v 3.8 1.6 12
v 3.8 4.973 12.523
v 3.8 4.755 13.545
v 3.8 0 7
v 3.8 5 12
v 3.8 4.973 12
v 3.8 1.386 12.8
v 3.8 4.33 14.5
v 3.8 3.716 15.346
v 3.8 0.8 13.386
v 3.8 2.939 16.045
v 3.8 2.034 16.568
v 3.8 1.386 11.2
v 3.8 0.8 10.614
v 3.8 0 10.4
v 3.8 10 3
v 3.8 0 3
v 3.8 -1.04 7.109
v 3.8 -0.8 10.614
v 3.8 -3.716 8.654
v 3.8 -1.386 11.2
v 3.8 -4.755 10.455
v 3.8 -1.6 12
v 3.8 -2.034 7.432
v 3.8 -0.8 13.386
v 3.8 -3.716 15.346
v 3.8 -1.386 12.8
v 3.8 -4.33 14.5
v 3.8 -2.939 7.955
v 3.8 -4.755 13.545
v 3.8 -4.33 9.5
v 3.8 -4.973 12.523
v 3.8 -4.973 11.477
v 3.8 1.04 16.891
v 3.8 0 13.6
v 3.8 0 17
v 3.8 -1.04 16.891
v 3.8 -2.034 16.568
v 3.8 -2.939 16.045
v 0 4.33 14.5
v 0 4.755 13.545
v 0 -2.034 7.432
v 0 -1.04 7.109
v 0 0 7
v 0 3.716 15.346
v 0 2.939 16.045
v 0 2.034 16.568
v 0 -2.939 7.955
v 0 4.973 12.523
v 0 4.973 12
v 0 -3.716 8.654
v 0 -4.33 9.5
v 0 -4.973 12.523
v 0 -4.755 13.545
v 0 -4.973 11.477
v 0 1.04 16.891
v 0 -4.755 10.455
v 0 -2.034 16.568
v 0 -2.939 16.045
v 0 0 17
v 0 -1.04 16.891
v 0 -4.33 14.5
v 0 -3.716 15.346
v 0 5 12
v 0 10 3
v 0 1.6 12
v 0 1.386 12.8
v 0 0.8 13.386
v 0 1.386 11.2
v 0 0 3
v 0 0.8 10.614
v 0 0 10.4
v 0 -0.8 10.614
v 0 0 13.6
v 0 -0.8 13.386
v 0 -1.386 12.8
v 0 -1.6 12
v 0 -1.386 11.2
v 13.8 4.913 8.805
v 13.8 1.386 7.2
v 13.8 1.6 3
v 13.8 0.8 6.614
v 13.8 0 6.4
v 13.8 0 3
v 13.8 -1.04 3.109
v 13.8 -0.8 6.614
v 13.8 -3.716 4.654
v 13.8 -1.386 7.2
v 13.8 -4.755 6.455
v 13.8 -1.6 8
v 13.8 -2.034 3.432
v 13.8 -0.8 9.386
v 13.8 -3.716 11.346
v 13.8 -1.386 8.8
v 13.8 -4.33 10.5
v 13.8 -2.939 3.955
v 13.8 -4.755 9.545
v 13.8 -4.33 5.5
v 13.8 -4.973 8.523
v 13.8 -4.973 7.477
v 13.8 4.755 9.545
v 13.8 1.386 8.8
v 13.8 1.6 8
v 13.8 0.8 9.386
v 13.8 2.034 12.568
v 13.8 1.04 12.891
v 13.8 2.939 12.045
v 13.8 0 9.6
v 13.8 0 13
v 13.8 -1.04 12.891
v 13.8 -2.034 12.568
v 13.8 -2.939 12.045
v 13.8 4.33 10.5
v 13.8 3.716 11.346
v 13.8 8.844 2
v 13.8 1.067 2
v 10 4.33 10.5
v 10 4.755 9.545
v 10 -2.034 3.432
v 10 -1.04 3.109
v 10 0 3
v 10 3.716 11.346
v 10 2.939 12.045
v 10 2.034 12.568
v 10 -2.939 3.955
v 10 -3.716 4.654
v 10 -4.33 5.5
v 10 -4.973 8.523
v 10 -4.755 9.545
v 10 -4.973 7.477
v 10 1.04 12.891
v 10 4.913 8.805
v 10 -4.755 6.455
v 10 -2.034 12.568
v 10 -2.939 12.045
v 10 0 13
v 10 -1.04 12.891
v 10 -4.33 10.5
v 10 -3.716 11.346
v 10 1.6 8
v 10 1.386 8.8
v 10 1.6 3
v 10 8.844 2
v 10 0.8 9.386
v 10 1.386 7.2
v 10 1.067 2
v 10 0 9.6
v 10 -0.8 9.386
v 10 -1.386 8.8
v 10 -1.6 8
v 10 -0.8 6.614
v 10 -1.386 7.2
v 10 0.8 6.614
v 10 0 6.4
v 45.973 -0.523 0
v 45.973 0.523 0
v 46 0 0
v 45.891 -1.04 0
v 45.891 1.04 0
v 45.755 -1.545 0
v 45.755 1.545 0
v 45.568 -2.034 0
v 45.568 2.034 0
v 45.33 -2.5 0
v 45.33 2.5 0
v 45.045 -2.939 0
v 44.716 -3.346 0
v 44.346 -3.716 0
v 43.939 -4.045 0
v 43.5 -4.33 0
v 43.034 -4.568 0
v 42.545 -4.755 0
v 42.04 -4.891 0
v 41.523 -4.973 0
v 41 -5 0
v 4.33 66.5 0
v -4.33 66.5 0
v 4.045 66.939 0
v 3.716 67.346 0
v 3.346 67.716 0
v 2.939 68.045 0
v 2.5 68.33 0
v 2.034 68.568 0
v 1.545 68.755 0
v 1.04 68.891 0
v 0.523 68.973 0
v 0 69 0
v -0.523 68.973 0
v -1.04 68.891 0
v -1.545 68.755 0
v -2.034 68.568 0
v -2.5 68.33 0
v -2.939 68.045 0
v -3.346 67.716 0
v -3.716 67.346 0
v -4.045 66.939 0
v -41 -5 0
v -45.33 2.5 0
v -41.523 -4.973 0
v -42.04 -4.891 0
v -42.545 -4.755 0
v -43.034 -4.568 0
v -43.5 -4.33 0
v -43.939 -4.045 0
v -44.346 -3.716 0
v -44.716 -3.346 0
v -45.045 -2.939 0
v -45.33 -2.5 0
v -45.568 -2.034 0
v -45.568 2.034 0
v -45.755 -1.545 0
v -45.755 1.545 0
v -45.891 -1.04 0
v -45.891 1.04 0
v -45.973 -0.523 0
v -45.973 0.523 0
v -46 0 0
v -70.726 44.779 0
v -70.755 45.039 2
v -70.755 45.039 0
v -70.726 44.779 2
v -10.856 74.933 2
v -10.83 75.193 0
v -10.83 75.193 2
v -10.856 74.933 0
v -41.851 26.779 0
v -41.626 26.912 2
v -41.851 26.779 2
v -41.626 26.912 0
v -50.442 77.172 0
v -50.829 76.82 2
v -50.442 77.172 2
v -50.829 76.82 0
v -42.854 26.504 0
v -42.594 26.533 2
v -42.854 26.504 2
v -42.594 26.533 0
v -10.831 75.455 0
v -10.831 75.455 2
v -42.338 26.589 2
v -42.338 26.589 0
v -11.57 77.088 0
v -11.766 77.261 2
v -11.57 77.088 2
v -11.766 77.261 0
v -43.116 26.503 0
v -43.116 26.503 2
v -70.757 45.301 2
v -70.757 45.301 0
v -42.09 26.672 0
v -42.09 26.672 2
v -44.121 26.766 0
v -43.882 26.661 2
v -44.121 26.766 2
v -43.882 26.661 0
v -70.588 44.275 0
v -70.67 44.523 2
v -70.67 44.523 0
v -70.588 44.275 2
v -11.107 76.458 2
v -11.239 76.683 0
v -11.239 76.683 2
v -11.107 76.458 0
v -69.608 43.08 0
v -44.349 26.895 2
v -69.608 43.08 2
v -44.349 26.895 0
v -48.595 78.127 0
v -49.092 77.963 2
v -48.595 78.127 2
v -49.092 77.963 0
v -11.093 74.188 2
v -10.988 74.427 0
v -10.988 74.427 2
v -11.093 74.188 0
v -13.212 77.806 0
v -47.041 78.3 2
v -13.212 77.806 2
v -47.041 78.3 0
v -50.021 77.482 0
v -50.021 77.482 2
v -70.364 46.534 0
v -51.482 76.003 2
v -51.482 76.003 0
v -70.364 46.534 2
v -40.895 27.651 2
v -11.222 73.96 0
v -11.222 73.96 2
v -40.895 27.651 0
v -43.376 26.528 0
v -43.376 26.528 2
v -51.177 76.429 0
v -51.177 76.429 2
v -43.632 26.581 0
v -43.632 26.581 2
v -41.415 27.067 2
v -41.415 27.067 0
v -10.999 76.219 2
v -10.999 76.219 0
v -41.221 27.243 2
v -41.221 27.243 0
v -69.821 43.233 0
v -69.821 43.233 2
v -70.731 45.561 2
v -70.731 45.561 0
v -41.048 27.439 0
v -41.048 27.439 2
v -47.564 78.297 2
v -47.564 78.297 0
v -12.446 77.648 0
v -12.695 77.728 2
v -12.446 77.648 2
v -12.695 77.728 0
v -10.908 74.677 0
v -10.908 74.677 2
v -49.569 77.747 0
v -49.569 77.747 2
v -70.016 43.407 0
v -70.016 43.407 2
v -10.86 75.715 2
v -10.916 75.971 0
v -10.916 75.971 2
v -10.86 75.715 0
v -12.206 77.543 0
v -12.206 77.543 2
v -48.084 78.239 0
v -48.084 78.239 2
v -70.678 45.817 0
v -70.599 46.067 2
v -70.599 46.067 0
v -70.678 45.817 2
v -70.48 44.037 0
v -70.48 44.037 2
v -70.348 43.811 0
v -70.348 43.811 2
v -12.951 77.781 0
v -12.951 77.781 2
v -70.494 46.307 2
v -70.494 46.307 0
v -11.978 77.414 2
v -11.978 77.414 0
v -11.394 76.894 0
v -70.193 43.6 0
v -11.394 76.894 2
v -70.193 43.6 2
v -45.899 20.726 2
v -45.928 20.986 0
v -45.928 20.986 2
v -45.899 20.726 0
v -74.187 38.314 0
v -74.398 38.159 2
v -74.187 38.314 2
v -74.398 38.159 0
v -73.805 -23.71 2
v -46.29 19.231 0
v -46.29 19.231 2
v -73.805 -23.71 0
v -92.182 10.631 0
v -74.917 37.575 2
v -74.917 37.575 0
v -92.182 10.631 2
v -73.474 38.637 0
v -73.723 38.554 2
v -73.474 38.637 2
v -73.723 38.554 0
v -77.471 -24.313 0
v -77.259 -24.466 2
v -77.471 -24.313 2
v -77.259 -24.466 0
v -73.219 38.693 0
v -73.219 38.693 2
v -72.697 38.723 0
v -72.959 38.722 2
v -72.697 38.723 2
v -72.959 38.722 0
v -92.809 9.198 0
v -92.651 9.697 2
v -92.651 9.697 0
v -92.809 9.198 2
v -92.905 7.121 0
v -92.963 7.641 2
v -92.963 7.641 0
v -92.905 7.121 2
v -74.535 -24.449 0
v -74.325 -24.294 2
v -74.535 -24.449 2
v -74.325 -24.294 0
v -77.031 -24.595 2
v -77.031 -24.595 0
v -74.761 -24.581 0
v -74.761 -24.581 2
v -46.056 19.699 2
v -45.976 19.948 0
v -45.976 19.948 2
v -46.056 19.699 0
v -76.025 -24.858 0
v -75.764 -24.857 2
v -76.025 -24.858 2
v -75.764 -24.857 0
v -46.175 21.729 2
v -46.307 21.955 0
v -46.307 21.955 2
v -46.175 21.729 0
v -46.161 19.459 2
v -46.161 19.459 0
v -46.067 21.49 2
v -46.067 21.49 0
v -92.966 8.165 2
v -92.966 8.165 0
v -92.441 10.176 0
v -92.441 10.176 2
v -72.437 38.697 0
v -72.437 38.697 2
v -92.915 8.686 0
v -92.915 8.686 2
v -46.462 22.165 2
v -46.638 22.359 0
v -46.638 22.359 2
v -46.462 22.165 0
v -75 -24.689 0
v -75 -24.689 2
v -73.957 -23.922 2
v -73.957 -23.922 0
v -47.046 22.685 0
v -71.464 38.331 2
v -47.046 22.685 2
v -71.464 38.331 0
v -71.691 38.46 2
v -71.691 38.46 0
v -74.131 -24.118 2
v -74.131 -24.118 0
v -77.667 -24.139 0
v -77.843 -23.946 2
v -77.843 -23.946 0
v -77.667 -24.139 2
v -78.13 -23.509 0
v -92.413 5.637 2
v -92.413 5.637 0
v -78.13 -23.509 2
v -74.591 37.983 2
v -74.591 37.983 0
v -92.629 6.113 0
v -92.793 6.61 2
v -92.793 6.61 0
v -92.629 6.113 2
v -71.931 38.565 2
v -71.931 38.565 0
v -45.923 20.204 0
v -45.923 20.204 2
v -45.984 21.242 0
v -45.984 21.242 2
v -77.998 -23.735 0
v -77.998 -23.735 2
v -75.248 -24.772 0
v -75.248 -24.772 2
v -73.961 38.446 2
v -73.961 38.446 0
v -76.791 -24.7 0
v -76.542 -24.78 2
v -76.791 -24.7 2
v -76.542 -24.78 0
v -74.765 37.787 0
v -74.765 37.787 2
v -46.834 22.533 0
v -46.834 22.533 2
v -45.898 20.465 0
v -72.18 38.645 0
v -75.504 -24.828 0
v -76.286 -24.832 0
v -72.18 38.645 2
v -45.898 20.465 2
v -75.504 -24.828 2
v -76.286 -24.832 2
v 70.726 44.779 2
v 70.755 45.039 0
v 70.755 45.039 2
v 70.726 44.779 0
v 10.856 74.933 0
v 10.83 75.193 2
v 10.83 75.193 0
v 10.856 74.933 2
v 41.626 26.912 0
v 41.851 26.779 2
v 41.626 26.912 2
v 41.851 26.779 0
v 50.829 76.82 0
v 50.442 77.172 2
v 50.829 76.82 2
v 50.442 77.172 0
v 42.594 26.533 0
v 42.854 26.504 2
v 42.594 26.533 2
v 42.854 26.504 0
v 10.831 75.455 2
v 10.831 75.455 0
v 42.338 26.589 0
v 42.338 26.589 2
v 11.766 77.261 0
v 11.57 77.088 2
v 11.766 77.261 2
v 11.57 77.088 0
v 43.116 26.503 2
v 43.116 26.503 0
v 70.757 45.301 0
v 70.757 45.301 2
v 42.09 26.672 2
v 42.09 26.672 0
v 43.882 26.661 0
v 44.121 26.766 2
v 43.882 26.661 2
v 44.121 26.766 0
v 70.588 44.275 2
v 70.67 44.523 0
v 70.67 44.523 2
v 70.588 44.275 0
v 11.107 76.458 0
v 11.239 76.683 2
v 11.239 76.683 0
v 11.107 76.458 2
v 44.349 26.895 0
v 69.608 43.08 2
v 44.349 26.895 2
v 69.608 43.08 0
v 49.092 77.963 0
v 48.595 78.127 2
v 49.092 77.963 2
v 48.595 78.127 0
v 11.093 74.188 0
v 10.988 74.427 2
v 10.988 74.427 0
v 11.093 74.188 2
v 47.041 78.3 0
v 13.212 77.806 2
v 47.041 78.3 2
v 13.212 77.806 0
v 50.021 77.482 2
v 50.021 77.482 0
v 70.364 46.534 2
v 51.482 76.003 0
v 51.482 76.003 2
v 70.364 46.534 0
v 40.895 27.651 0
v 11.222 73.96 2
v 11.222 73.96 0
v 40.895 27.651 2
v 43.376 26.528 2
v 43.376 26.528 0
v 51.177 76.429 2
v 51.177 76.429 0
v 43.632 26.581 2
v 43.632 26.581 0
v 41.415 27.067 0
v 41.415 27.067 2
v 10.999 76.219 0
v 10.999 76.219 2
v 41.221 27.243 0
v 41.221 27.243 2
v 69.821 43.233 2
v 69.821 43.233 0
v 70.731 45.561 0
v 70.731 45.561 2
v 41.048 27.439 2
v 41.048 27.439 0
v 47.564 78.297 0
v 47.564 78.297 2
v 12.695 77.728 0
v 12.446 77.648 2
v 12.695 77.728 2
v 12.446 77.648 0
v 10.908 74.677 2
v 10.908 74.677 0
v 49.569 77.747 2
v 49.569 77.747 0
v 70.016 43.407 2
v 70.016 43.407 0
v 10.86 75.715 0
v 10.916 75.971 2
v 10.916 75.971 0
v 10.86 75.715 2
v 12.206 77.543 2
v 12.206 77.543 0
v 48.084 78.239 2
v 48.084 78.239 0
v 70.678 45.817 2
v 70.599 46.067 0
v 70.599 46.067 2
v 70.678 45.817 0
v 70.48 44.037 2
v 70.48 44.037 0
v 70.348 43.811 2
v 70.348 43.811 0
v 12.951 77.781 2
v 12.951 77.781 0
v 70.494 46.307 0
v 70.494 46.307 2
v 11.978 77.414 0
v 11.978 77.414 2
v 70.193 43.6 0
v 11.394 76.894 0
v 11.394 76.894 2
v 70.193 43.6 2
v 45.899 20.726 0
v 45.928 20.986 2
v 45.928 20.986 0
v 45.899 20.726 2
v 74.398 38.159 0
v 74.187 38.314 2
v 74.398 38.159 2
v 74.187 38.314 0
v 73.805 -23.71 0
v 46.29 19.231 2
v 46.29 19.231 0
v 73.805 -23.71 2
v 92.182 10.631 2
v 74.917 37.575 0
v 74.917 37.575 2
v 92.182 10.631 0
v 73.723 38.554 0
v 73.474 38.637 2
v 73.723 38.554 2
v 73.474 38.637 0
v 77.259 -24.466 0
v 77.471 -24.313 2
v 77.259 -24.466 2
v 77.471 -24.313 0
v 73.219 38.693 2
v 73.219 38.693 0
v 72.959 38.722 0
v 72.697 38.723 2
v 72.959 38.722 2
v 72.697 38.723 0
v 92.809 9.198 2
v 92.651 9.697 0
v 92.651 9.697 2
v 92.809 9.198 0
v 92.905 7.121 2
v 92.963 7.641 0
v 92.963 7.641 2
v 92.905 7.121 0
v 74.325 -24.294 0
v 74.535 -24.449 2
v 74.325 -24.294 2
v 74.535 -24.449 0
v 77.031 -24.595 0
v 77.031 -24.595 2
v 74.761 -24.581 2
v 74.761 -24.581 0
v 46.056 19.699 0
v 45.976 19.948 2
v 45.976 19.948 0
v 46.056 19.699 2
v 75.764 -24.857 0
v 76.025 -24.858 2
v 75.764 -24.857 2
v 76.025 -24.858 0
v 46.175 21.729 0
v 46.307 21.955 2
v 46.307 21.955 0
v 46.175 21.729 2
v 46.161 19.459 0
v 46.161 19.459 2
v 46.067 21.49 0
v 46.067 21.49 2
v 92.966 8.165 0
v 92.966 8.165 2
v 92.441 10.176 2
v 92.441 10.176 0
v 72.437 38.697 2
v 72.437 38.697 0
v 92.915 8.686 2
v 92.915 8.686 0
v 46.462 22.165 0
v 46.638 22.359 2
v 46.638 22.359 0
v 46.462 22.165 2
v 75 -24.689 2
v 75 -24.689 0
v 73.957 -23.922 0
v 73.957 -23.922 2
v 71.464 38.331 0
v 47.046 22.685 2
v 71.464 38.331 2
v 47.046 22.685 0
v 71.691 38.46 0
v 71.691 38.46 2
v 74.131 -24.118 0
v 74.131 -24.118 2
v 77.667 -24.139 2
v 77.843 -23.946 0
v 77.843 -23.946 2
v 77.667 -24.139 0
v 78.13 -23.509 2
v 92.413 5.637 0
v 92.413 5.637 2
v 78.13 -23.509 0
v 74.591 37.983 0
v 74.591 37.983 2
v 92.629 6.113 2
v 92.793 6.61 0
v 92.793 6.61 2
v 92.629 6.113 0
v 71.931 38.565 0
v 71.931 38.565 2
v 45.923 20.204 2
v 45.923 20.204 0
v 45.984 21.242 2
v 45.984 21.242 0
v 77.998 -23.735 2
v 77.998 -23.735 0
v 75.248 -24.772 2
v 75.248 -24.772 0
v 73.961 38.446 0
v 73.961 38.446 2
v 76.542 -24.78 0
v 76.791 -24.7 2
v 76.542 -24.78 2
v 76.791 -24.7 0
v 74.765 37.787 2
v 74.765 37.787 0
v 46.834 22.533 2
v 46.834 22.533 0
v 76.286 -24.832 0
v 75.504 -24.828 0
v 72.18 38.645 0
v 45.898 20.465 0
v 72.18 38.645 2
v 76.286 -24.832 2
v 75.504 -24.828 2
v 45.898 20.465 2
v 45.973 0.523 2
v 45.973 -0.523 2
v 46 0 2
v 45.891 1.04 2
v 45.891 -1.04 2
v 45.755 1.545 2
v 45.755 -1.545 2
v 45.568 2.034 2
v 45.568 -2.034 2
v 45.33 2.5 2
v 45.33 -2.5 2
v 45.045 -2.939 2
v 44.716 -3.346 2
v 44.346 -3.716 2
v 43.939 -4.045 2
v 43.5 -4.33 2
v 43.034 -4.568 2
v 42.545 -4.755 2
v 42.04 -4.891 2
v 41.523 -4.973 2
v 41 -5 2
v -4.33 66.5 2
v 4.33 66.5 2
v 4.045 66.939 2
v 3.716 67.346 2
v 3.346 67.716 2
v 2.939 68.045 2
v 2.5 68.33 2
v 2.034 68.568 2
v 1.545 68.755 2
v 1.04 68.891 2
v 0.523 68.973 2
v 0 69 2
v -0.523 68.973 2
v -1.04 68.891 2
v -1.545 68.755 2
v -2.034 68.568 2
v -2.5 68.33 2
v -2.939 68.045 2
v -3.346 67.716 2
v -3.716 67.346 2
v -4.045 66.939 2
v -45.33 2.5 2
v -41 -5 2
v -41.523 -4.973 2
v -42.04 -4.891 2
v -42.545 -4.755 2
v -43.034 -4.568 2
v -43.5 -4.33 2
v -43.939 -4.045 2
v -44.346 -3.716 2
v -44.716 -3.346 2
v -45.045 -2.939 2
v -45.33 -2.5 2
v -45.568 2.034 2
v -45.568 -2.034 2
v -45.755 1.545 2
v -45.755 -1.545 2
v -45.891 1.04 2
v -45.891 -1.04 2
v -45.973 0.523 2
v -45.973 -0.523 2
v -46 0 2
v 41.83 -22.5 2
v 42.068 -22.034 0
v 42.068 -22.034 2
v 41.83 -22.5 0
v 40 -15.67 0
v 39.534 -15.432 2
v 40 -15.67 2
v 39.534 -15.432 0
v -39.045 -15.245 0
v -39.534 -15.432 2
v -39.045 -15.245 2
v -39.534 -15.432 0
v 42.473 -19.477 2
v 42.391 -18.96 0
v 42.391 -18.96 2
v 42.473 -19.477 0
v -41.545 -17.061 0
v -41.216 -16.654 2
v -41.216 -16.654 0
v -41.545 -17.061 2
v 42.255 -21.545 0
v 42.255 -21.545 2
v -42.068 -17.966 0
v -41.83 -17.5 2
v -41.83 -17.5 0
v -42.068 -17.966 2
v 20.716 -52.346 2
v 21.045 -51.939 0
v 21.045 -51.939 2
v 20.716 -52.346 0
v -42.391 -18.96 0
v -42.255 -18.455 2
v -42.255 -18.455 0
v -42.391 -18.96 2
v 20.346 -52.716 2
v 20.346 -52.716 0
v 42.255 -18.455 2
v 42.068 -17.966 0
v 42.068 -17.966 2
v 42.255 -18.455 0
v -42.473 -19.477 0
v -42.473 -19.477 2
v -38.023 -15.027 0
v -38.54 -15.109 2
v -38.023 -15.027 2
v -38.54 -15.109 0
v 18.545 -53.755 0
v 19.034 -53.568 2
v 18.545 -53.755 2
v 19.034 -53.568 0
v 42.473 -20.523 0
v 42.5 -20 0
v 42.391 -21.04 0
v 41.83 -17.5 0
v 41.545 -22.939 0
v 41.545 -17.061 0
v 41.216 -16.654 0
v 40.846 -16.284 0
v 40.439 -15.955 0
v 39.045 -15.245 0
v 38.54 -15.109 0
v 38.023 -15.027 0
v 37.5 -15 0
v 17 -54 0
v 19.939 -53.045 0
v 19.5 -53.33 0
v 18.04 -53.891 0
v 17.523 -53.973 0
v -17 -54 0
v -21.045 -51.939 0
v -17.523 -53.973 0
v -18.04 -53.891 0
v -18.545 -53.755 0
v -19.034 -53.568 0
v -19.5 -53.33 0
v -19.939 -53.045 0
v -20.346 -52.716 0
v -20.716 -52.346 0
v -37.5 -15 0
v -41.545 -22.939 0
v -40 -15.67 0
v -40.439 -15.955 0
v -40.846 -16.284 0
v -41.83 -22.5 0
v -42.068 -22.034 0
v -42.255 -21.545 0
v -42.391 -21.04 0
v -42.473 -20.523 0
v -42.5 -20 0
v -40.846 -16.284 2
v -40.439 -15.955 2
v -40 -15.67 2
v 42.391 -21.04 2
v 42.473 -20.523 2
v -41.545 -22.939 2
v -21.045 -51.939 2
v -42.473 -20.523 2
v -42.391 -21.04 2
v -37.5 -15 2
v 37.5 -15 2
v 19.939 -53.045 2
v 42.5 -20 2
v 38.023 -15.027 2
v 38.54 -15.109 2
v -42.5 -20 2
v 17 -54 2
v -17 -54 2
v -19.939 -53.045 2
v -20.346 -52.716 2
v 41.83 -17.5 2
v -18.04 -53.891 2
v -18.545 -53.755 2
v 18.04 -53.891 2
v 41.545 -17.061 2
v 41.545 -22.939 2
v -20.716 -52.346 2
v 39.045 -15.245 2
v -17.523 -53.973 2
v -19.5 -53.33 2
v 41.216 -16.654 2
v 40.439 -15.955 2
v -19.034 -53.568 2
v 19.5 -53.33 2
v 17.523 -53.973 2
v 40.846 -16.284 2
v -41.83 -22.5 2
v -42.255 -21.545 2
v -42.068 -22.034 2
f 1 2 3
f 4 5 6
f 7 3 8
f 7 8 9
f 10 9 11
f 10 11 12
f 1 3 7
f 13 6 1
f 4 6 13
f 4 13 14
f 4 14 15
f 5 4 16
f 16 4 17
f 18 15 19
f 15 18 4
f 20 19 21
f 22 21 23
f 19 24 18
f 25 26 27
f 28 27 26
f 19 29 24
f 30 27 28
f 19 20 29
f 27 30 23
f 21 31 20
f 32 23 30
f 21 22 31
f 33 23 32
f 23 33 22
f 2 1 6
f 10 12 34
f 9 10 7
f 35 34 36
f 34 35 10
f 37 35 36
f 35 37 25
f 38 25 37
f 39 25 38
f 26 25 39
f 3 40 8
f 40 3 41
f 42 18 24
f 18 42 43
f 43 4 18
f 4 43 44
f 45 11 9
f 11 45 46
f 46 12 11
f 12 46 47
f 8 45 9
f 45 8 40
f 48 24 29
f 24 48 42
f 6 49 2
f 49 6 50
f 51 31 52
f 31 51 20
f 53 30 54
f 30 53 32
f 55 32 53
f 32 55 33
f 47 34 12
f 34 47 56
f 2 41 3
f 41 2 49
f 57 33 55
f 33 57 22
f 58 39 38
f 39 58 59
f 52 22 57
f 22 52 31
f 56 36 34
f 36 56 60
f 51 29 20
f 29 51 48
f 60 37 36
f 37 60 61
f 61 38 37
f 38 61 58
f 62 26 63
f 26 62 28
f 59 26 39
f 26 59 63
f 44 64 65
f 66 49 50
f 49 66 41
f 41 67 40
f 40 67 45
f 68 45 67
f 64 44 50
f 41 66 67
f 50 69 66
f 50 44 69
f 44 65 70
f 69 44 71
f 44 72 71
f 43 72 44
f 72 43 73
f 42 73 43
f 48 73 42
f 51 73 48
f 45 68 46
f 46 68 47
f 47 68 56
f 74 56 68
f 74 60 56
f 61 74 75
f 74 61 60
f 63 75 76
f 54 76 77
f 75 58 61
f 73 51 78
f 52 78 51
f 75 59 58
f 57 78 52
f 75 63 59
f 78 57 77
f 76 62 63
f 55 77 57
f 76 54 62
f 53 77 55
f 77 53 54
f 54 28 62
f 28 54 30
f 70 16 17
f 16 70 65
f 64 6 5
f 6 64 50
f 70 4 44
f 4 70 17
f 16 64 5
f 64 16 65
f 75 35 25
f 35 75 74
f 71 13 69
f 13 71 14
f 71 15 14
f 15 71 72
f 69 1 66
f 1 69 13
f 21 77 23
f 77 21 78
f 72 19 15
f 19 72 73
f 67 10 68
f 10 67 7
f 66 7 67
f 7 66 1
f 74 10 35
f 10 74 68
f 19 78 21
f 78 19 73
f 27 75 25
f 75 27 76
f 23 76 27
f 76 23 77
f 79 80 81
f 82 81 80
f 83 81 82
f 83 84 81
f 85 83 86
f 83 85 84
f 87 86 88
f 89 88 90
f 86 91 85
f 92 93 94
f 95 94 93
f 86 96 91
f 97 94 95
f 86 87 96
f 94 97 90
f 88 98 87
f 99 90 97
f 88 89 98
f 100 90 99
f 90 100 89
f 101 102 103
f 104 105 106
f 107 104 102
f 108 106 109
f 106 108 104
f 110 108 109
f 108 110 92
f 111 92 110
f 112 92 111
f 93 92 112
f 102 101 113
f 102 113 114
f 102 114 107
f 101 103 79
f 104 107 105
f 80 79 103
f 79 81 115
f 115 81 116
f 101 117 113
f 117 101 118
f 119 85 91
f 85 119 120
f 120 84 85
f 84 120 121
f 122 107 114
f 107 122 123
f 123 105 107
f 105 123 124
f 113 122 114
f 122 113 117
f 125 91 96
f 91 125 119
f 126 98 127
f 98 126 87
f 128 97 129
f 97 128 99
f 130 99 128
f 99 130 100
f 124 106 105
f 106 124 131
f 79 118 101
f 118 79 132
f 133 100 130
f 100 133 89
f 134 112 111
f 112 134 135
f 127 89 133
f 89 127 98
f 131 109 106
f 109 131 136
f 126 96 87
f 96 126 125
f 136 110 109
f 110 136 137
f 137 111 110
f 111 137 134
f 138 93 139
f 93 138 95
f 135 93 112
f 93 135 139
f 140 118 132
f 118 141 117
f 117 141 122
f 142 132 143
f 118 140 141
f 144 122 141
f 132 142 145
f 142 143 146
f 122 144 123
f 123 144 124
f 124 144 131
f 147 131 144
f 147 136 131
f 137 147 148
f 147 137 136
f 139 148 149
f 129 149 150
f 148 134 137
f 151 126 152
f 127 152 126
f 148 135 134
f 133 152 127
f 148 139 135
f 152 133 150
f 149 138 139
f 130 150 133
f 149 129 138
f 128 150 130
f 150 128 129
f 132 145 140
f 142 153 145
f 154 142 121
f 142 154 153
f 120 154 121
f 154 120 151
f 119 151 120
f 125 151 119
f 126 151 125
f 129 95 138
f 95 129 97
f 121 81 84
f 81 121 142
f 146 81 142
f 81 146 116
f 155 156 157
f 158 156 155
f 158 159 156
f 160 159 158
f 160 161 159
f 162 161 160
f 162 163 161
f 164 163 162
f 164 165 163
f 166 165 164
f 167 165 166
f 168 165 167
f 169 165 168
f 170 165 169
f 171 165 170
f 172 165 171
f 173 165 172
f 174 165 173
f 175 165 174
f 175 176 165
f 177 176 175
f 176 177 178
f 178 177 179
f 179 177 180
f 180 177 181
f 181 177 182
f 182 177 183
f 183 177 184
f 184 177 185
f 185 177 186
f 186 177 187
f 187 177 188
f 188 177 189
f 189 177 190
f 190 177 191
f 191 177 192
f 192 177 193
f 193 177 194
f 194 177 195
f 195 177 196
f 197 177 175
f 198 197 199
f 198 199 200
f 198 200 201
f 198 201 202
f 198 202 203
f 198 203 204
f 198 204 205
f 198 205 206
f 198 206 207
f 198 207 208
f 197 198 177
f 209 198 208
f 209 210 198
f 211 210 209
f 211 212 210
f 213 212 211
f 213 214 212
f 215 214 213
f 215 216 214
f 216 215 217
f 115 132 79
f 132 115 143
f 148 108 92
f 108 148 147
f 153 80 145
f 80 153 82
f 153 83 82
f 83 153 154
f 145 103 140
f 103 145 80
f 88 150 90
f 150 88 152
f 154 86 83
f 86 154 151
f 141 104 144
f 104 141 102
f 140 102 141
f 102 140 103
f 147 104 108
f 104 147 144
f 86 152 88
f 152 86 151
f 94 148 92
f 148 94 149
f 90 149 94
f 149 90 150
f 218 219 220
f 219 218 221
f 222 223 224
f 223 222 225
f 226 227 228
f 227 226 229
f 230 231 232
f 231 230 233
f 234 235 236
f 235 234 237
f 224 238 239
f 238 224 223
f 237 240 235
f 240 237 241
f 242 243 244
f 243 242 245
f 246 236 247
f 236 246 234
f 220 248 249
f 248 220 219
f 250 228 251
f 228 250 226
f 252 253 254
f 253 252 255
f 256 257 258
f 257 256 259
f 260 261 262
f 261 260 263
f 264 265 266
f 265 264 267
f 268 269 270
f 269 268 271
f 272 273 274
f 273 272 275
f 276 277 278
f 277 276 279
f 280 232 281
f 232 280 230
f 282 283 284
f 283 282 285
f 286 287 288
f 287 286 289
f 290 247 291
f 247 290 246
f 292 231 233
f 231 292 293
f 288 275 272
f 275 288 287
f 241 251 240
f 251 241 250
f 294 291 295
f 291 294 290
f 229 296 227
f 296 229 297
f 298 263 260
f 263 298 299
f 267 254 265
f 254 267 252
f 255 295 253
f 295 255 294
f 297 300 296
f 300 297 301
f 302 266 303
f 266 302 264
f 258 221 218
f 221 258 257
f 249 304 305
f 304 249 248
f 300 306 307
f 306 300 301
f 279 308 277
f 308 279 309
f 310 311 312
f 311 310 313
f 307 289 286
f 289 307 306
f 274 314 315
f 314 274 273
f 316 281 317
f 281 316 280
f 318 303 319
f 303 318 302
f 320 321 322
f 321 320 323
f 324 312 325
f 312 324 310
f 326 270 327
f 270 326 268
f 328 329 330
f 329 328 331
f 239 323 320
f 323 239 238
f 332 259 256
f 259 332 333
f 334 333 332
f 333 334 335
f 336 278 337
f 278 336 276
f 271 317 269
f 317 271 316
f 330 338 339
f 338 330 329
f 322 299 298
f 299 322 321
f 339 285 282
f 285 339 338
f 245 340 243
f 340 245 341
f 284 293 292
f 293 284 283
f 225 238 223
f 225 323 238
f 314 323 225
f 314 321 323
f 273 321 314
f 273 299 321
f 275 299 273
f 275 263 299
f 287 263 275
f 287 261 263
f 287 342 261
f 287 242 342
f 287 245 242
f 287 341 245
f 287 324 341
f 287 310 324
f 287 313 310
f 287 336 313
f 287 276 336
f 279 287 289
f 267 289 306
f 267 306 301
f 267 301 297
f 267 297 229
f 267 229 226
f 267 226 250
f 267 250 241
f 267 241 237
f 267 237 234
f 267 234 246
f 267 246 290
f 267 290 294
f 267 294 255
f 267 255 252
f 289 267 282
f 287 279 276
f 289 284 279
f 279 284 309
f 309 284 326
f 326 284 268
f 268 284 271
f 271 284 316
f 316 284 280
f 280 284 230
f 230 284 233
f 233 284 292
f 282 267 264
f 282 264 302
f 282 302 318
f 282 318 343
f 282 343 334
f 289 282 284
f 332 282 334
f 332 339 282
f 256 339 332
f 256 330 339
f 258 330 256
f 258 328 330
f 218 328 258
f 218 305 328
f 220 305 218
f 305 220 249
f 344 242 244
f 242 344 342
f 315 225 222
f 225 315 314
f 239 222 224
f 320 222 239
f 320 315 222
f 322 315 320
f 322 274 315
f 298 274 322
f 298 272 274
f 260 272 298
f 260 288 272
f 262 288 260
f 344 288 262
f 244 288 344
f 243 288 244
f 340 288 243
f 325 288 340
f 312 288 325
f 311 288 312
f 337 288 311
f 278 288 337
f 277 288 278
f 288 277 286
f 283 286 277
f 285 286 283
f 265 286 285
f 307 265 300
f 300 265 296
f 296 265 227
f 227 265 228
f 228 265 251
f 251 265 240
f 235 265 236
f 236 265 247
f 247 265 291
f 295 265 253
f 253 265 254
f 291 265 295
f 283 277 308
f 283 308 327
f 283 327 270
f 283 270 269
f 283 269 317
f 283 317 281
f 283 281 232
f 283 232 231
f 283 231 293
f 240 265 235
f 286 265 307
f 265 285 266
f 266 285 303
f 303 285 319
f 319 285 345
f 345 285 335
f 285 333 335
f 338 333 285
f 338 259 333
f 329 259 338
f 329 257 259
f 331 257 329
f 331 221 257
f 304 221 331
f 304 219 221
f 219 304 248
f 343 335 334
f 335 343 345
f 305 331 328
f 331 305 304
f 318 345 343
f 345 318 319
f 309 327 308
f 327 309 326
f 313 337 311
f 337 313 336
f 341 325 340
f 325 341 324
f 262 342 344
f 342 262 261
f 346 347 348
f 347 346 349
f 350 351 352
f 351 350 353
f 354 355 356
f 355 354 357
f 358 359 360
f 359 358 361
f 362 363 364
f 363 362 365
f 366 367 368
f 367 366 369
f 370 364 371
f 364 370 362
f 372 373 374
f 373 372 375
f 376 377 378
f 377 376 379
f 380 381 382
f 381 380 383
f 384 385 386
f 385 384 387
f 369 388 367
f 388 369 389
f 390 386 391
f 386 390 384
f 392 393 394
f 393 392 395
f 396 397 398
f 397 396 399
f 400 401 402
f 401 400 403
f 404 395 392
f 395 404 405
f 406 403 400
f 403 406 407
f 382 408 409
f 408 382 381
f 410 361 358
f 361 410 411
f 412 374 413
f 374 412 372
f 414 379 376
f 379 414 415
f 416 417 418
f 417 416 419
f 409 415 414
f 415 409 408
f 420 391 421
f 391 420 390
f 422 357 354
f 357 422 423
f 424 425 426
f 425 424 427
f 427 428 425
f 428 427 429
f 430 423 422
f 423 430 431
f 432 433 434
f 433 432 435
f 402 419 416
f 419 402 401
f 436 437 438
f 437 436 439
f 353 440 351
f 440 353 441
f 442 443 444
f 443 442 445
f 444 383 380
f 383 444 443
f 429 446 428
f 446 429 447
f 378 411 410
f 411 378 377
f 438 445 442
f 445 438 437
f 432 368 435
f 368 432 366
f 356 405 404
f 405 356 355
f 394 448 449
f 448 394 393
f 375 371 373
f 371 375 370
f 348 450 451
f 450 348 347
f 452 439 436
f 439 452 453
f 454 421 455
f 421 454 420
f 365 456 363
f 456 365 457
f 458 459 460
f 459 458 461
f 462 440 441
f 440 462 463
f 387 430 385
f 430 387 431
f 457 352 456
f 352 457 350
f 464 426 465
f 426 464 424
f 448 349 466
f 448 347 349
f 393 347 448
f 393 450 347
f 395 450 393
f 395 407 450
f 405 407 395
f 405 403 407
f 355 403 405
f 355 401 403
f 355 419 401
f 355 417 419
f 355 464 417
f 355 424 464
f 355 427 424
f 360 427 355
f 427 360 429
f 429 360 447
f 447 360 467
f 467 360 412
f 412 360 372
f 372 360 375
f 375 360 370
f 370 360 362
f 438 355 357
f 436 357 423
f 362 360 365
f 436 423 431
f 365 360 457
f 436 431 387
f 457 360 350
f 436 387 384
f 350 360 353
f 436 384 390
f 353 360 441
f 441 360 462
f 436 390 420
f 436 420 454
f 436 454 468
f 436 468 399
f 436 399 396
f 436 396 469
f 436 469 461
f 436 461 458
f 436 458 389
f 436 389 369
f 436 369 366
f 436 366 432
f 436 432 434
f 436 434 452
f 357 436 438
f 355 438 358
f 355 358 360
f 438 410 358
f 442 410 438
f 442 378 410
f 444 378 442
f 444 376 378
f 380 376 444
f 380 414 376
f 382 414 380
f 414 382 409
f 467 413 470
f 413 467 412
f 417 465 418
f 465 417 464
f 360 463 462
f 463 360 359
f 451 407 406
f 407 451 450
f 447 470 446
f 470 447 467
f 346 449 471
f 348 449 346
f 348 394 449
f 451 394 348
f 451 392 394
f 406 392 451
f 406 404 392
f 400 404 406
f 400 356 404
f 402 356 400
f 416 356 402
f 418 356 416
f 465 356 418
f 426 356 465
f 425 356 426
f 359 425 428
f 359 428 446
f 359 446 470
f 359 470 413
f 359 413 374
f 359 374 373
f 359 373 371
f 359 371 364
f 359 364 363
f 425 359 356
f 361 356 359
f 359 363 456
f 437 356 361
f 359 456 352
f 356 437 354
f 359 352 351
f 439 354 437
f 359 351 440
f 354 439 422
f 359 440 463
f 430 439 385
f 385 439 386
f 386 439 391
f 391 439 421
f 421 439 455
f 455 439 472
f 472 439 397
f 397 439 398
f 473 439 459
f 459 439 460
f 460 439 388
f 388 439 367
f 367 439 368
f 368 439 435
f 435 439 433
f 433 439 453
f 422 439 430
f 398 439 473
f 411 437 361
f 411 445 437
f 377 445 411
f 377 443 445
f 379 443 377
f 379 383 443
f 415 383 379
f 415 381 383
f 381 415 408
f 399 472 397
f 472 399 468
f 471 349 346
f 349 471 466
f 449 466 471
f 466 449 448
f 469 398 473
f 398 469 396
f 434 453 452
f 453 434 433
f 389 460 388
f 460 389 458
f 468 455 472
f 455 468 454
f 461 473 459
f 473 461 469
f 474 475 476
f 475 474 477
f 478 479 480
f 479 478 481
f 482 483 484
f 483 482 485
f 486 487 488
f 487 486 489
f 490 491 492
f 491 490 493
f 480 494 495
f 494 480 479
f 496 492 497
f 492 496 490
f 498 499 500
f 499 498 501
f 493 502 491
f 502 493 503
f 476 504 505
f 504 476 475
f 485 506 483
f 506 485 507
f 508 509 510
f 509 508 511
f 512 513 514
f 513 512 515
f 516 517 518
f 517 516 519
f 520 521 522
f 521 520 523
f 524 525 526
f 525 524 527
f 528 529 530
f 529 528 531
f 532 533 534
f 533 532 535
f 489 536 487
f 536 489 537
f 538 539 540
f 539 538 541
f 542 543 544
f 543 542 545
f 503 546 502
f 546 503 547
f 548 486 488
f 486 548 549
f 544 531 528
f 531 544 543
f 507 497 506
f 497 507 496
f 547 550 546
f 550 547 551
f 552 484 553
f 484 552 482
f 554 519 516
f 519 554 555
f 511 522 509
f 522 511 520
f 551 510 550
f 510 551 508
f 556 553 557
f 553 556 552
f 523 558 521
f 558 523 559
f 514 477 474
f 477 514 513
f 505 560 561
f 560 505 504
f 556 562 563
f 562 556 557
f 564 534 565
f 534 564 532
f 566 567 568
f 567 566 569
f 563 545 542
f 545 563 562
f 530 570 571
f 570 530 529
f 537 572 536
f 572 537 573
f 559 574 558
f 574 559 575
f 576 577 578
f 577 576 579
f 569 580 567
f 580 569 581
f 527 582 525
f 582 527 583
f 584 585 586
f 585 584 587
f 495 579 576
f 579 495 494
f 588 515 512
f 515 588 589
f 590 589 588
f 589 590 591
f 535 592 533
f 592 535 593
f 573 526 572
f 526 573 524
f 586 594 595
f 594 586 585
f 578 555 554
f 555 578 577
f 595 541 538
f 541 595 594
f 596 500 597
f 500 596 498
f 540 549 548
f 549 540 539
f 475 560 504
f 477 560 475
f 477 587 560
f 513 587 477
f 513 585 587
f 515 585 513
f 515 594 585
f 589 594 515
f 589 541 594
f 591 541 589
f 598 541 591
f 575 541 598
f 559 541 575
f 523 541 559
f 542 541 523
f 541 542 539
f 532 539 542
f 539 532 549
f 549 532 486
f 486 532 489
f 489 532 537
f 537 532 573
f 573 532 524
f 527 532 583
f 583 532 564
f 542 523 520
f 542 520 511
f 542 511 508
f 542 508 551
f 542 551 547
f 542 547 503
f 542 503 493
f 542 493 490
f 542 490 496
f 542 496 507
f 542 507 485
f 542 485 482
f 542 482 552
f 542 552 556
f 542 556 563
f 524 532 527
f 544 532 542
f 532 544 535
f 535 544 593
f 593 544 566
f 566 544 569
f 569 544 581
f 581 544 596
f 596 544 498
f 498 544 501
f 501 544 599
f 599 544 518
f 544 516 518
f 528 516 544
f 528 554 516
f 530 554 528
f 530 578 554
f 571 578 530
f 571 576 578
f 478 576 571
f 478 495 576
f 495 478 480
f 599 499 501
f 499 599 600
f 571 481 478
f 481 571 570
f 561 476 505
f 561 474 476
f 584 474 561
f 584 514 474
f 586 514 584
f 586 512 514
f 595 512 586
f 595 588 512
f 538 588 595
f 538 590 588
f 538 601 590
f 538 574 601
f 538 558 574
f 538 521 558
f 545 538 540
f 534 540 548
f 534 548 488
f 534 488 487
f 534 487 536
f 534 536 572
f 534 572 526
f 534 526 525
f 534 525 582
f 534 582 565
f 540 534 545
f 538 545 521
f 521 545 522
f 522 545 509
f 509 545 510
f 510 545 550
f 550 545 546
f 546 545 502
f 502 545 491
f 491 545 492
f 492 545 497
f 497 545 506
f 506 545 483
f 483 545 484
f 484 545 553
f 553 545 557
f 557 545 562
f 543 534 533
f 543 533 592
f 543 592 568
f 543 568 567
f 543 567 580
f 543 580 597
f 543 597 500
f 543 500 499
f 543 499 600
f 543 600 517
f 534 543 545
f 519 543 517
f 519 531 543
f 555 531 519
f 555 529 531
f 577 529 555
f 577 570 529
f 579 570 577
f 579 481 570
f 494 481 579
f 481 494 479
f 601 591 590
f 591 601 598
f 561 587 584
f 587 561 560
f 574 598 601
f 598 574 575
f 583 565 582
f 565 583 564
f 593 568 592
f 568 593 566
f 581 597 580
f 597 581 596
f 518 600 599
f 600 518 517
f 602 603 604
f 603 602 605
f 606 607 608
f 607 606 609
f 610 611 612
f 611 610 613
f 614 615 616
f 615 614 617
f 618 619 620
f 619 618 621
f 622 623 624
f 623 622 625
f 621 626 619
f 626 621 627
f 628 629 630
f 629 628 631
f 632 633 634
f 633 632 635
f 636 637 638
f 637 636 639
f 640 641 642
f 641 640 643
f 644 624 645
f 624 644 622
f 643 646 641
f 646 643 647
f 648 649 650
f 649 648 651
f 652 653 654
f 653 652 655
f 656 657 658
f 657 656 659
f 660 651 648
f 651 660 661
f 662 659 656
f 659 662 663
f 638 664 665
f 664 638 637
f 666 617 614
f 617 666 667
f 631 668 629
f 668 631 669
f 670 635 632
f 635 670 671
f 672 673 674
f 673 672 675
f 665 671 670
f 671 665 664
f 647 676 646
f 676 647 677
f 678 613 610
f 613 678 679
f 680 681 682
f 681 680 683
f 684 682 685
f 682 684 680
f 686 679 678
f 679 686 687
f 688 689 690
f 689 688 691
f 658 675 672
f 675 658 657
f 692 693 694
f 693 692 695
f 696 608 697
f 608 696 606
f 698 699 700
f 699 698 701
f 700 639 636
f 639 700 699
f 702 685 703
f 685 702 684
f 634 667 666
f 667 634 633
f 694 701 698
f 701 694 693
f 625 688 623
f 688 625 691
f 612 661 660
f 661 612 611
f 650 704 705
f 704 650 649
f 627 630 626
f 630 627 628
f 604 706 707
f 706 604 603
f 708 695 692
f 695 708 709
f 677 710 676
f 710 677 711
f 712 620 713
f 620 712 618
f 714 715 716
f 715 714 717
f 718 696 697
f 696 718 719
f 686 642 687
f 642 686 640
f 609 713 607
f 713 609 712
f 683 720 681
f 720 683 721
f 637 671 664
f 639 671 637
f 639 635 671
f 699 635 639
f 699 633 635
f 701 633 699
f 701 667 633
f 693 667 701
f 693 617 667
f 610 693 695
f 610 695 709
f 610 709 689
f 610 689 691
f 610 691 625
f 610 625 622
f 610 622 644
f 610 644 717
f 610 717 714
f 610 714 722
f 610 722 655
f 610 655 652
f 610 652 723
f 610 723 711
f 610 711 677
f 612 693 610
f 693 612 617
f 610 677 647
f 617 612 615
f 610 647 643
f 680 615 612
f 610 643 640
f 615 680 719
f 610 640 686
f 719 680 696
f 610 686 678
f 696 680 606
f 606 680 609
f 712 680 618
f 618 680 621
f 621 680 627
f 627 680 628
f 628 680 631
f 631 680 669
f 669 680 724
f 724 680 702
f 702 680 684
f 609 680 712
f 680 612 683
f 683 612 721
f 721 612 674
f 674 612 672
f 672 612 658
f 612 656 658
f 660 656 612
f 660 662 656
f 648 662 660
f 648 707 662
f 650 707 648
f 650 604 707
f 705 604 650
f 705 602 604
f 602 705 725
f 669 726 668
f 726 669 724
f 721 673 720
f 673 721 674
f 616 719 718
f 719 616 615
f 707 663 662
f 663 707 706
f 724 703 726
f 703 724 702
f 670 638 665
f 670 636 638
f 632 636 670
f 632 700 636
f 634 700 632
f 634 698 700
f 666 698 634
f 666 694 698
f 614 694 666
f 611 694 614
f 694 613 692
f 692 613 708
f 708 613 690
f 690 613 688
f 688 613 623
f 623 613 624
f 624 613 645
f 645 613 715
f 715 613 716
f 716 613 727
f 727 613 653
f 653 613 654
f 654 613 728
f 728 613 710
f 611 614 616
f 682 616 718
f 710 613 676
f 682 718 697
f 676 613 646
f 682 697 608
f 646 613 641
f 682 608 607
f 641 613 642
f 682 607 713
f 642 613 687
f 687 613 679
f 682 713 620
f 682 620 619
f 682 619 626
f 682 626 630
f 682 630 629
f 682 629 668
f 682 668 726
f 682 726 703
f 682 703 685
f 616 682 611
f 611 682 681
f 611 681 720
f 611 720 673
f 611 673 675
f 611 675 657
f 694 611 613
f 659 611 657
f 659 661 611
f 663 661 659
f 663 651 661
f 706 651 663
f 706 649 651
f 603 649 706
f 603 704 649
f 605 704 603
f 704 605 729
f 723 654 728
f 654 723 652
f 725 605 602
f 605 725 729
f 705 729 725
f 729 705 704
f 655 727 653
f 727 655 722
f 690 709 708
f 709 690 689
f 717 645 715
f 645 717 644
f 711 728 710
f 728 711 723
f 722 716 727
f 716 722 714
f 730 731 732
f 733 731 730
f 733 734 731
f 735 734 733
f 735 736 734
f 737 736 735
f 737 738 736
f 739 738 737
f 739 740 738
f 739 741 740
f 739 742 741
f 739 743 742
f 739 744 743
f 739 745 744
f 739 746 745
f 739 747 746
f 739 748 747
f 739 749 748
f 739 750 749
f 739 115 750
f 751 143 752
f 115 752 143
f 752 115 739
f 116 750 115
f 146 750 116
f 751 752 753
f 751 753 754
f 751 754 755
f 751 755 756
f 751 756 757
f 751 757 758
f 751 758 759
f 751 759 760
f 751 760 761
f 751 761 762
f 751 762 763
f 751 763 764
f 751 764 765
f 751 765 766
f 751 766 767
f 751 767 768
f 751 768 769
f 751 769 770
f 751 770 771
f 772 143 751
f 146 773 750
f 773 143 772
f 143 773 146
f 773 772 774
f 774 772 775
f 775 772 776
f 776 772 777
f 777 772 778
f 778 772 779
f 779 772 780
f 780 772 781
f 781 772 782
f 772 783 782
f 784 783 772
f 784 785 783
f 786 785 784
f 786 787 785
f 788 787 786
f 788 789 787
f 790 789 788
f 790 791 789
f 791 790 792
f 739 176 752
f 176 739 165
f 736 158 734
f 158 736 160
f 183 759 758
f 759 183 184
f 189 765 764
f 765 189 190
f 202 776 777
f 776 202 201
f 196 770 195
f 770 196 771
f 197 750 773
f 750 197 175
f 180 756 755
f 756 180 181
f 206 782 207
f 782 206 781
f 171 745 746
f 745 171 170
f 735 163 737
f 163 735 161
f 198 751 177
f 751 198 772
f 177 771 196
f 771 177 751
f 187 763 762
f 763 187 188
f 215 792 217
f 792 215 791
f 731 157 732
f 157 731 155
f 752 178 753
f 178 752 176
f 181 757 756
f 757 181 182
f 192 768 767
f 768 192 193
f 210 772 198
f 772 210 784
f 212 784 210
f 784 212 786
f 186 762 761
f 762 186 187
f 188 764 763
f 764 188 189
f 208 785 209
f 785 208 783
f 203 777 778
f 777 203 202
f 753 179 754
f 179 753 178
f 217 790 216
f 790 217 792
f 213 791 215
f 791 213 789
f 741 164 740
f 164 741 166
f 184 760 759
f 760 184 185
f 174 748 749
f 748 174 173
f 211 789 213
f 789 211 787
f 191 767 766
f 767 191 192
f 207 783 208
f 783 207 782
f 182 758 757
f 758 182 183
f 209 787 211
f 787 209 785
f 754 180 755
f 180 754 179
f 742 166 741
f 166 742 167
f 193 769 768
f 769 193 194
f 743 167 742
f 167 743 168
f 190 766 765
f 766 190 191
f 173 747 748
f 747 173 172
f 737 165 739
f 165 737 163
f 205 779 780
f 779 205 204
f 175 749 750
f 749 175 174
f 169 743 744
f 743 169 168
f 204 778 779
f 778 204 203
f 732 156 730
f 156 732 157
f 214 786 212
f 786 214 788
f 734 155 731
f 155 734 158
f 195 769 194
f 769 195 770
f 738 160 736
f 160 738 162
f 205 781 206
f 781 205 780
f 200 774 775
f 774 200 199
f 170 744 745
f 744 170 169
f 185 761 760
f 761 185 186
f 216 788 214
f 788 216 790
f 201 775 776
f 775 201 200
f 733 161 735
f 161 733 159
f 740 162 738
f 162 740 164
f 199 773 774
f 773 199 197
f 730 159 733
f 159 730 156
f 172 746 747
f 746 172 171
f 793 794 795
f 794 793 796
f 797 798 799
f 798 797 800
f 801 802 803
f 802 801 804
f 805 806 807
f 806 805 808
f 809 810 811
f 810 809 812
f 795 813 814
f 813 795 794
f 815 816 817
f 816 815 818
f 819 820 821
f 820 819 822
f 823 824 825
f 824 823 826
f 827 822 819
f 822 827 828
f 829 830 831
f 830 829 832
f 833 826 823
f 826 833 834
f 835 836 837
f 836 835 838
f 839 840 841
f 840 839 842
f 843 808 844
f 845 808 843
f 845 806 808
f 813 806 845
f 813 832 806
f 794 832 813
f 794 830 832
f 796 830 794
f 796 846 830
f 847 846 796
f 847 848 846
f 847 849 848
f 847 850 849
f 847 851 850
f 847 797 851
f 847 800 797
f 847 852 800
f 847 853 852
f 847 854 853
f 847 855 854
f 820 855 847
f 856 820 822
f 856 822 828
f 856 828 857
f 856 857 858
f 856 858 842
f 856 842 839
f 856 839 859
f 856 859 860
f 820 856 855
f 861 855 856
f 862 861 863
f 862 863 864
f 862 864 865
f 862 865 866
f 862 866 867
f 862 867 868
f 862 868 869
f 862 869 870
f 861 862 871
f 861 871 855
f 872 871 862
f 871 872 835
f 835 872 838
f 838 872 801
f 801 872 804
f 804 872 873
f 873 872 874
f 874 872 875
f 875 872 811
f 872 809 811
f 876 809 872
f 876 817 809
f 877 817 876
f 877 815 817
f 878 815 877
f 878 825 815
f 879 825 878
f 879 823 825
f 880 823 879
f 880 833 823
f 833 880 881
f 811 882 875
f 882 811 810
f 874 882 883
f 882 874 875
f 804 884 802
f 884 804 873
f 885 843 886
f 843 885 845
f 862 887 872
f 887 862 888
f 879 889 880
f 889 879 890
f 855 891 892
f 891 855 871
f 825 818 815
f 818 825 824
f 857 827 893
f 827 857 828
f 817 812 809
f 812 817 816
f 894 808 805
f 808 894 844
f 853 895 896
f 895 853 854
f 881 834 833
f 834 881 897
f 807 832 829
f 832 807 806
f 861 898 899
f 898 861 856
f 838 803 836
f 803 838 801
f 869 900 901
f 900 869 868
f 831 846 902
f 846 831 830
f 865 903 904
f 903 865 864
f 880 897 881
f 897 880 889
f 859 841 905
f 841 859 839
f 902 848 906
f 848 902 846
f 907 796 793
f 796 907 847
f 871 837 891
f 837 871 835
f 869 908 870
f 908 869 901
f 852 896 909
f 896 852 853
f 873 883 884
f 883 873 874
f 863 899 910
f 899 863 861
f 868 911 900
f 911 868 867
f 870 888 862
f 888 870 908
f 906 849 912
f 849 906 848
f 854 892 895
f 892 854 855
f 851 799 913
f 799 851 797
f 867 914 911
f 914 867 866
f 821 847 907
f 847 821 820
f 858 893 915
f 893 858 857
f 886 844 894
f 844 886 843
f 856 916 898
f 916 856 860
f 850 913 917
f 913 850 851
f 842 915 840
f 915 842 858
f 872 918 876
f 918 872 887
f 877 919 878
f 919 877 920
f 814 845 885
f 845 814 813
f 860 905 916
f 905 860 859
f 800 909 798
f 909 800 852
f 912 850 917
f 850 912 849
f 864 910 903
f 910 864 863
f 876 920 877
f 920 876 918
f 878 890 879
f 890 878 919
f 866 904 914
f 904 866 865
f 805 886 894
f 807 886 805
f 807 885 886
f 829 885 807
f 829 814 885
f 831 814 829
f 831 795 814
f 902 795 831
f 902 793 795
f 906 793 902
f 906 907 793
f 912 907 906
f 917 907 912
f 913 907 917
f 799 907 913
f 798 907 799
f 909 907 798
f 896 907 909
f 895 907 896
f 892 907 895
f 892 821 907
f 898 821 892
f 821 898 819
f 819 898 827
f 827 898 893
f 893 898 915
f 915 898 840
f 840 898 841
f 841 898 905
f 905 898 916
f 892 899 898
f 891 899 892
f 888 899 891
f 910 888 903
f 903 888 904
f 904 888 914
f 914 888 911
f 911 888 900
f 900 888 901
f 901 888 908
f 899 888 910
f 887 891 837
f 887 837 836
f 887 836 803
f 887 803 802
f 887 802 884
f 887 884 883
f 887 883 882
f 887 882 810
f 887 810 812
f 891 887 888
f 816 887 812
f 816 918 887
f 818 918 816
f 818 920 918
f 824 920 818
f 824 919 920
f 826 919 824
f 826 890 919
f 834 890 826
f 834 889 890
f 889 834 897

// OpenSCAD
$fn=60;

bisagra();

translate([10,0,0])bisagra2();

hull(){
translate([-41,0,0])cylinder(d=10,h=2);
translate([41,0,0])cylinder(d=10,h=2);
translate([0,64,0])cylinder(d=10,h=2);
}

hull(){
translate([-37.5,-20,0])cylinder(d=10,h=2);
translate([37.5,-20,0])cylinder(d=10,h=2);
translate([-17,-49,0])cylinder(d=10,h=2);
translate([17,-49,0])cylinder(d=10,h=2);
}

translate([-43,29,0])rotate([0,0,-122.65])
{
hull(){
translate([-55,0,0])cylinder(d=5,h=2);
translate([0,0,0])cylinder(d=5,h=2);
translate([-35,-27.5,0])cylinder(d=10,h=2);
translate([0,-30,0])cylinder(d=5,h=2);
}
hull(){
translate([61,0,0])cylinder(d=5,h=2);
translate([10,0,0])cylinder(d=5,h=2);
translate([42,-26.5,0])cylinder(d=10,h=2);
translate([10,-29,0])cylinder(d=5,h=2);
}}

mirror([1,0,0])
translate([-43,29,0])rotate([0,0,-122.65])
{
hull(){
translate([-55,0,0])cylinder(d=5,h=2);
translate([0,0,0])cylinder(d=5,h=2);
translate([-35,-27.5,0])cylinder(d=10,h=2);
translate([0,-30,0])cylinder(d=5,h=2);
}
hull(){
translate([61,0,0])cylinder(d=5,h=2);
translate([10,0,0])cylinder(d=5,h=2);
translate([42,-26.5,0])cylinder(d=10,h=2);
translate([10,-29,0])cylinder(d=5,h=2);
}}

module bisagra(){
translate([0,0,12])rotate([0,90,0])
difference(){
union(){
    cylinder(d=10,h=3.8,$fn=30);
    cube([9,5,3.8]);
    linear_extrude(3.8)polygon([[9,0],[0,5],[9,10]]);
}
cylinder(d=3.2,h=4,$fn=12);
}
}

module bisagra2(){
translate([0,0,8])rotate([0,90,0])
difference(){
union(){
    cylinder(d=10,h=3.8,$fn=30);
    cube([5,5,3.8]);
    linear_extrude(3.8)polygon([[8,0],[-1,4.8],[8,10]]);
}
cylinder(d=3.2,h=4,$fn=12);
}
}
